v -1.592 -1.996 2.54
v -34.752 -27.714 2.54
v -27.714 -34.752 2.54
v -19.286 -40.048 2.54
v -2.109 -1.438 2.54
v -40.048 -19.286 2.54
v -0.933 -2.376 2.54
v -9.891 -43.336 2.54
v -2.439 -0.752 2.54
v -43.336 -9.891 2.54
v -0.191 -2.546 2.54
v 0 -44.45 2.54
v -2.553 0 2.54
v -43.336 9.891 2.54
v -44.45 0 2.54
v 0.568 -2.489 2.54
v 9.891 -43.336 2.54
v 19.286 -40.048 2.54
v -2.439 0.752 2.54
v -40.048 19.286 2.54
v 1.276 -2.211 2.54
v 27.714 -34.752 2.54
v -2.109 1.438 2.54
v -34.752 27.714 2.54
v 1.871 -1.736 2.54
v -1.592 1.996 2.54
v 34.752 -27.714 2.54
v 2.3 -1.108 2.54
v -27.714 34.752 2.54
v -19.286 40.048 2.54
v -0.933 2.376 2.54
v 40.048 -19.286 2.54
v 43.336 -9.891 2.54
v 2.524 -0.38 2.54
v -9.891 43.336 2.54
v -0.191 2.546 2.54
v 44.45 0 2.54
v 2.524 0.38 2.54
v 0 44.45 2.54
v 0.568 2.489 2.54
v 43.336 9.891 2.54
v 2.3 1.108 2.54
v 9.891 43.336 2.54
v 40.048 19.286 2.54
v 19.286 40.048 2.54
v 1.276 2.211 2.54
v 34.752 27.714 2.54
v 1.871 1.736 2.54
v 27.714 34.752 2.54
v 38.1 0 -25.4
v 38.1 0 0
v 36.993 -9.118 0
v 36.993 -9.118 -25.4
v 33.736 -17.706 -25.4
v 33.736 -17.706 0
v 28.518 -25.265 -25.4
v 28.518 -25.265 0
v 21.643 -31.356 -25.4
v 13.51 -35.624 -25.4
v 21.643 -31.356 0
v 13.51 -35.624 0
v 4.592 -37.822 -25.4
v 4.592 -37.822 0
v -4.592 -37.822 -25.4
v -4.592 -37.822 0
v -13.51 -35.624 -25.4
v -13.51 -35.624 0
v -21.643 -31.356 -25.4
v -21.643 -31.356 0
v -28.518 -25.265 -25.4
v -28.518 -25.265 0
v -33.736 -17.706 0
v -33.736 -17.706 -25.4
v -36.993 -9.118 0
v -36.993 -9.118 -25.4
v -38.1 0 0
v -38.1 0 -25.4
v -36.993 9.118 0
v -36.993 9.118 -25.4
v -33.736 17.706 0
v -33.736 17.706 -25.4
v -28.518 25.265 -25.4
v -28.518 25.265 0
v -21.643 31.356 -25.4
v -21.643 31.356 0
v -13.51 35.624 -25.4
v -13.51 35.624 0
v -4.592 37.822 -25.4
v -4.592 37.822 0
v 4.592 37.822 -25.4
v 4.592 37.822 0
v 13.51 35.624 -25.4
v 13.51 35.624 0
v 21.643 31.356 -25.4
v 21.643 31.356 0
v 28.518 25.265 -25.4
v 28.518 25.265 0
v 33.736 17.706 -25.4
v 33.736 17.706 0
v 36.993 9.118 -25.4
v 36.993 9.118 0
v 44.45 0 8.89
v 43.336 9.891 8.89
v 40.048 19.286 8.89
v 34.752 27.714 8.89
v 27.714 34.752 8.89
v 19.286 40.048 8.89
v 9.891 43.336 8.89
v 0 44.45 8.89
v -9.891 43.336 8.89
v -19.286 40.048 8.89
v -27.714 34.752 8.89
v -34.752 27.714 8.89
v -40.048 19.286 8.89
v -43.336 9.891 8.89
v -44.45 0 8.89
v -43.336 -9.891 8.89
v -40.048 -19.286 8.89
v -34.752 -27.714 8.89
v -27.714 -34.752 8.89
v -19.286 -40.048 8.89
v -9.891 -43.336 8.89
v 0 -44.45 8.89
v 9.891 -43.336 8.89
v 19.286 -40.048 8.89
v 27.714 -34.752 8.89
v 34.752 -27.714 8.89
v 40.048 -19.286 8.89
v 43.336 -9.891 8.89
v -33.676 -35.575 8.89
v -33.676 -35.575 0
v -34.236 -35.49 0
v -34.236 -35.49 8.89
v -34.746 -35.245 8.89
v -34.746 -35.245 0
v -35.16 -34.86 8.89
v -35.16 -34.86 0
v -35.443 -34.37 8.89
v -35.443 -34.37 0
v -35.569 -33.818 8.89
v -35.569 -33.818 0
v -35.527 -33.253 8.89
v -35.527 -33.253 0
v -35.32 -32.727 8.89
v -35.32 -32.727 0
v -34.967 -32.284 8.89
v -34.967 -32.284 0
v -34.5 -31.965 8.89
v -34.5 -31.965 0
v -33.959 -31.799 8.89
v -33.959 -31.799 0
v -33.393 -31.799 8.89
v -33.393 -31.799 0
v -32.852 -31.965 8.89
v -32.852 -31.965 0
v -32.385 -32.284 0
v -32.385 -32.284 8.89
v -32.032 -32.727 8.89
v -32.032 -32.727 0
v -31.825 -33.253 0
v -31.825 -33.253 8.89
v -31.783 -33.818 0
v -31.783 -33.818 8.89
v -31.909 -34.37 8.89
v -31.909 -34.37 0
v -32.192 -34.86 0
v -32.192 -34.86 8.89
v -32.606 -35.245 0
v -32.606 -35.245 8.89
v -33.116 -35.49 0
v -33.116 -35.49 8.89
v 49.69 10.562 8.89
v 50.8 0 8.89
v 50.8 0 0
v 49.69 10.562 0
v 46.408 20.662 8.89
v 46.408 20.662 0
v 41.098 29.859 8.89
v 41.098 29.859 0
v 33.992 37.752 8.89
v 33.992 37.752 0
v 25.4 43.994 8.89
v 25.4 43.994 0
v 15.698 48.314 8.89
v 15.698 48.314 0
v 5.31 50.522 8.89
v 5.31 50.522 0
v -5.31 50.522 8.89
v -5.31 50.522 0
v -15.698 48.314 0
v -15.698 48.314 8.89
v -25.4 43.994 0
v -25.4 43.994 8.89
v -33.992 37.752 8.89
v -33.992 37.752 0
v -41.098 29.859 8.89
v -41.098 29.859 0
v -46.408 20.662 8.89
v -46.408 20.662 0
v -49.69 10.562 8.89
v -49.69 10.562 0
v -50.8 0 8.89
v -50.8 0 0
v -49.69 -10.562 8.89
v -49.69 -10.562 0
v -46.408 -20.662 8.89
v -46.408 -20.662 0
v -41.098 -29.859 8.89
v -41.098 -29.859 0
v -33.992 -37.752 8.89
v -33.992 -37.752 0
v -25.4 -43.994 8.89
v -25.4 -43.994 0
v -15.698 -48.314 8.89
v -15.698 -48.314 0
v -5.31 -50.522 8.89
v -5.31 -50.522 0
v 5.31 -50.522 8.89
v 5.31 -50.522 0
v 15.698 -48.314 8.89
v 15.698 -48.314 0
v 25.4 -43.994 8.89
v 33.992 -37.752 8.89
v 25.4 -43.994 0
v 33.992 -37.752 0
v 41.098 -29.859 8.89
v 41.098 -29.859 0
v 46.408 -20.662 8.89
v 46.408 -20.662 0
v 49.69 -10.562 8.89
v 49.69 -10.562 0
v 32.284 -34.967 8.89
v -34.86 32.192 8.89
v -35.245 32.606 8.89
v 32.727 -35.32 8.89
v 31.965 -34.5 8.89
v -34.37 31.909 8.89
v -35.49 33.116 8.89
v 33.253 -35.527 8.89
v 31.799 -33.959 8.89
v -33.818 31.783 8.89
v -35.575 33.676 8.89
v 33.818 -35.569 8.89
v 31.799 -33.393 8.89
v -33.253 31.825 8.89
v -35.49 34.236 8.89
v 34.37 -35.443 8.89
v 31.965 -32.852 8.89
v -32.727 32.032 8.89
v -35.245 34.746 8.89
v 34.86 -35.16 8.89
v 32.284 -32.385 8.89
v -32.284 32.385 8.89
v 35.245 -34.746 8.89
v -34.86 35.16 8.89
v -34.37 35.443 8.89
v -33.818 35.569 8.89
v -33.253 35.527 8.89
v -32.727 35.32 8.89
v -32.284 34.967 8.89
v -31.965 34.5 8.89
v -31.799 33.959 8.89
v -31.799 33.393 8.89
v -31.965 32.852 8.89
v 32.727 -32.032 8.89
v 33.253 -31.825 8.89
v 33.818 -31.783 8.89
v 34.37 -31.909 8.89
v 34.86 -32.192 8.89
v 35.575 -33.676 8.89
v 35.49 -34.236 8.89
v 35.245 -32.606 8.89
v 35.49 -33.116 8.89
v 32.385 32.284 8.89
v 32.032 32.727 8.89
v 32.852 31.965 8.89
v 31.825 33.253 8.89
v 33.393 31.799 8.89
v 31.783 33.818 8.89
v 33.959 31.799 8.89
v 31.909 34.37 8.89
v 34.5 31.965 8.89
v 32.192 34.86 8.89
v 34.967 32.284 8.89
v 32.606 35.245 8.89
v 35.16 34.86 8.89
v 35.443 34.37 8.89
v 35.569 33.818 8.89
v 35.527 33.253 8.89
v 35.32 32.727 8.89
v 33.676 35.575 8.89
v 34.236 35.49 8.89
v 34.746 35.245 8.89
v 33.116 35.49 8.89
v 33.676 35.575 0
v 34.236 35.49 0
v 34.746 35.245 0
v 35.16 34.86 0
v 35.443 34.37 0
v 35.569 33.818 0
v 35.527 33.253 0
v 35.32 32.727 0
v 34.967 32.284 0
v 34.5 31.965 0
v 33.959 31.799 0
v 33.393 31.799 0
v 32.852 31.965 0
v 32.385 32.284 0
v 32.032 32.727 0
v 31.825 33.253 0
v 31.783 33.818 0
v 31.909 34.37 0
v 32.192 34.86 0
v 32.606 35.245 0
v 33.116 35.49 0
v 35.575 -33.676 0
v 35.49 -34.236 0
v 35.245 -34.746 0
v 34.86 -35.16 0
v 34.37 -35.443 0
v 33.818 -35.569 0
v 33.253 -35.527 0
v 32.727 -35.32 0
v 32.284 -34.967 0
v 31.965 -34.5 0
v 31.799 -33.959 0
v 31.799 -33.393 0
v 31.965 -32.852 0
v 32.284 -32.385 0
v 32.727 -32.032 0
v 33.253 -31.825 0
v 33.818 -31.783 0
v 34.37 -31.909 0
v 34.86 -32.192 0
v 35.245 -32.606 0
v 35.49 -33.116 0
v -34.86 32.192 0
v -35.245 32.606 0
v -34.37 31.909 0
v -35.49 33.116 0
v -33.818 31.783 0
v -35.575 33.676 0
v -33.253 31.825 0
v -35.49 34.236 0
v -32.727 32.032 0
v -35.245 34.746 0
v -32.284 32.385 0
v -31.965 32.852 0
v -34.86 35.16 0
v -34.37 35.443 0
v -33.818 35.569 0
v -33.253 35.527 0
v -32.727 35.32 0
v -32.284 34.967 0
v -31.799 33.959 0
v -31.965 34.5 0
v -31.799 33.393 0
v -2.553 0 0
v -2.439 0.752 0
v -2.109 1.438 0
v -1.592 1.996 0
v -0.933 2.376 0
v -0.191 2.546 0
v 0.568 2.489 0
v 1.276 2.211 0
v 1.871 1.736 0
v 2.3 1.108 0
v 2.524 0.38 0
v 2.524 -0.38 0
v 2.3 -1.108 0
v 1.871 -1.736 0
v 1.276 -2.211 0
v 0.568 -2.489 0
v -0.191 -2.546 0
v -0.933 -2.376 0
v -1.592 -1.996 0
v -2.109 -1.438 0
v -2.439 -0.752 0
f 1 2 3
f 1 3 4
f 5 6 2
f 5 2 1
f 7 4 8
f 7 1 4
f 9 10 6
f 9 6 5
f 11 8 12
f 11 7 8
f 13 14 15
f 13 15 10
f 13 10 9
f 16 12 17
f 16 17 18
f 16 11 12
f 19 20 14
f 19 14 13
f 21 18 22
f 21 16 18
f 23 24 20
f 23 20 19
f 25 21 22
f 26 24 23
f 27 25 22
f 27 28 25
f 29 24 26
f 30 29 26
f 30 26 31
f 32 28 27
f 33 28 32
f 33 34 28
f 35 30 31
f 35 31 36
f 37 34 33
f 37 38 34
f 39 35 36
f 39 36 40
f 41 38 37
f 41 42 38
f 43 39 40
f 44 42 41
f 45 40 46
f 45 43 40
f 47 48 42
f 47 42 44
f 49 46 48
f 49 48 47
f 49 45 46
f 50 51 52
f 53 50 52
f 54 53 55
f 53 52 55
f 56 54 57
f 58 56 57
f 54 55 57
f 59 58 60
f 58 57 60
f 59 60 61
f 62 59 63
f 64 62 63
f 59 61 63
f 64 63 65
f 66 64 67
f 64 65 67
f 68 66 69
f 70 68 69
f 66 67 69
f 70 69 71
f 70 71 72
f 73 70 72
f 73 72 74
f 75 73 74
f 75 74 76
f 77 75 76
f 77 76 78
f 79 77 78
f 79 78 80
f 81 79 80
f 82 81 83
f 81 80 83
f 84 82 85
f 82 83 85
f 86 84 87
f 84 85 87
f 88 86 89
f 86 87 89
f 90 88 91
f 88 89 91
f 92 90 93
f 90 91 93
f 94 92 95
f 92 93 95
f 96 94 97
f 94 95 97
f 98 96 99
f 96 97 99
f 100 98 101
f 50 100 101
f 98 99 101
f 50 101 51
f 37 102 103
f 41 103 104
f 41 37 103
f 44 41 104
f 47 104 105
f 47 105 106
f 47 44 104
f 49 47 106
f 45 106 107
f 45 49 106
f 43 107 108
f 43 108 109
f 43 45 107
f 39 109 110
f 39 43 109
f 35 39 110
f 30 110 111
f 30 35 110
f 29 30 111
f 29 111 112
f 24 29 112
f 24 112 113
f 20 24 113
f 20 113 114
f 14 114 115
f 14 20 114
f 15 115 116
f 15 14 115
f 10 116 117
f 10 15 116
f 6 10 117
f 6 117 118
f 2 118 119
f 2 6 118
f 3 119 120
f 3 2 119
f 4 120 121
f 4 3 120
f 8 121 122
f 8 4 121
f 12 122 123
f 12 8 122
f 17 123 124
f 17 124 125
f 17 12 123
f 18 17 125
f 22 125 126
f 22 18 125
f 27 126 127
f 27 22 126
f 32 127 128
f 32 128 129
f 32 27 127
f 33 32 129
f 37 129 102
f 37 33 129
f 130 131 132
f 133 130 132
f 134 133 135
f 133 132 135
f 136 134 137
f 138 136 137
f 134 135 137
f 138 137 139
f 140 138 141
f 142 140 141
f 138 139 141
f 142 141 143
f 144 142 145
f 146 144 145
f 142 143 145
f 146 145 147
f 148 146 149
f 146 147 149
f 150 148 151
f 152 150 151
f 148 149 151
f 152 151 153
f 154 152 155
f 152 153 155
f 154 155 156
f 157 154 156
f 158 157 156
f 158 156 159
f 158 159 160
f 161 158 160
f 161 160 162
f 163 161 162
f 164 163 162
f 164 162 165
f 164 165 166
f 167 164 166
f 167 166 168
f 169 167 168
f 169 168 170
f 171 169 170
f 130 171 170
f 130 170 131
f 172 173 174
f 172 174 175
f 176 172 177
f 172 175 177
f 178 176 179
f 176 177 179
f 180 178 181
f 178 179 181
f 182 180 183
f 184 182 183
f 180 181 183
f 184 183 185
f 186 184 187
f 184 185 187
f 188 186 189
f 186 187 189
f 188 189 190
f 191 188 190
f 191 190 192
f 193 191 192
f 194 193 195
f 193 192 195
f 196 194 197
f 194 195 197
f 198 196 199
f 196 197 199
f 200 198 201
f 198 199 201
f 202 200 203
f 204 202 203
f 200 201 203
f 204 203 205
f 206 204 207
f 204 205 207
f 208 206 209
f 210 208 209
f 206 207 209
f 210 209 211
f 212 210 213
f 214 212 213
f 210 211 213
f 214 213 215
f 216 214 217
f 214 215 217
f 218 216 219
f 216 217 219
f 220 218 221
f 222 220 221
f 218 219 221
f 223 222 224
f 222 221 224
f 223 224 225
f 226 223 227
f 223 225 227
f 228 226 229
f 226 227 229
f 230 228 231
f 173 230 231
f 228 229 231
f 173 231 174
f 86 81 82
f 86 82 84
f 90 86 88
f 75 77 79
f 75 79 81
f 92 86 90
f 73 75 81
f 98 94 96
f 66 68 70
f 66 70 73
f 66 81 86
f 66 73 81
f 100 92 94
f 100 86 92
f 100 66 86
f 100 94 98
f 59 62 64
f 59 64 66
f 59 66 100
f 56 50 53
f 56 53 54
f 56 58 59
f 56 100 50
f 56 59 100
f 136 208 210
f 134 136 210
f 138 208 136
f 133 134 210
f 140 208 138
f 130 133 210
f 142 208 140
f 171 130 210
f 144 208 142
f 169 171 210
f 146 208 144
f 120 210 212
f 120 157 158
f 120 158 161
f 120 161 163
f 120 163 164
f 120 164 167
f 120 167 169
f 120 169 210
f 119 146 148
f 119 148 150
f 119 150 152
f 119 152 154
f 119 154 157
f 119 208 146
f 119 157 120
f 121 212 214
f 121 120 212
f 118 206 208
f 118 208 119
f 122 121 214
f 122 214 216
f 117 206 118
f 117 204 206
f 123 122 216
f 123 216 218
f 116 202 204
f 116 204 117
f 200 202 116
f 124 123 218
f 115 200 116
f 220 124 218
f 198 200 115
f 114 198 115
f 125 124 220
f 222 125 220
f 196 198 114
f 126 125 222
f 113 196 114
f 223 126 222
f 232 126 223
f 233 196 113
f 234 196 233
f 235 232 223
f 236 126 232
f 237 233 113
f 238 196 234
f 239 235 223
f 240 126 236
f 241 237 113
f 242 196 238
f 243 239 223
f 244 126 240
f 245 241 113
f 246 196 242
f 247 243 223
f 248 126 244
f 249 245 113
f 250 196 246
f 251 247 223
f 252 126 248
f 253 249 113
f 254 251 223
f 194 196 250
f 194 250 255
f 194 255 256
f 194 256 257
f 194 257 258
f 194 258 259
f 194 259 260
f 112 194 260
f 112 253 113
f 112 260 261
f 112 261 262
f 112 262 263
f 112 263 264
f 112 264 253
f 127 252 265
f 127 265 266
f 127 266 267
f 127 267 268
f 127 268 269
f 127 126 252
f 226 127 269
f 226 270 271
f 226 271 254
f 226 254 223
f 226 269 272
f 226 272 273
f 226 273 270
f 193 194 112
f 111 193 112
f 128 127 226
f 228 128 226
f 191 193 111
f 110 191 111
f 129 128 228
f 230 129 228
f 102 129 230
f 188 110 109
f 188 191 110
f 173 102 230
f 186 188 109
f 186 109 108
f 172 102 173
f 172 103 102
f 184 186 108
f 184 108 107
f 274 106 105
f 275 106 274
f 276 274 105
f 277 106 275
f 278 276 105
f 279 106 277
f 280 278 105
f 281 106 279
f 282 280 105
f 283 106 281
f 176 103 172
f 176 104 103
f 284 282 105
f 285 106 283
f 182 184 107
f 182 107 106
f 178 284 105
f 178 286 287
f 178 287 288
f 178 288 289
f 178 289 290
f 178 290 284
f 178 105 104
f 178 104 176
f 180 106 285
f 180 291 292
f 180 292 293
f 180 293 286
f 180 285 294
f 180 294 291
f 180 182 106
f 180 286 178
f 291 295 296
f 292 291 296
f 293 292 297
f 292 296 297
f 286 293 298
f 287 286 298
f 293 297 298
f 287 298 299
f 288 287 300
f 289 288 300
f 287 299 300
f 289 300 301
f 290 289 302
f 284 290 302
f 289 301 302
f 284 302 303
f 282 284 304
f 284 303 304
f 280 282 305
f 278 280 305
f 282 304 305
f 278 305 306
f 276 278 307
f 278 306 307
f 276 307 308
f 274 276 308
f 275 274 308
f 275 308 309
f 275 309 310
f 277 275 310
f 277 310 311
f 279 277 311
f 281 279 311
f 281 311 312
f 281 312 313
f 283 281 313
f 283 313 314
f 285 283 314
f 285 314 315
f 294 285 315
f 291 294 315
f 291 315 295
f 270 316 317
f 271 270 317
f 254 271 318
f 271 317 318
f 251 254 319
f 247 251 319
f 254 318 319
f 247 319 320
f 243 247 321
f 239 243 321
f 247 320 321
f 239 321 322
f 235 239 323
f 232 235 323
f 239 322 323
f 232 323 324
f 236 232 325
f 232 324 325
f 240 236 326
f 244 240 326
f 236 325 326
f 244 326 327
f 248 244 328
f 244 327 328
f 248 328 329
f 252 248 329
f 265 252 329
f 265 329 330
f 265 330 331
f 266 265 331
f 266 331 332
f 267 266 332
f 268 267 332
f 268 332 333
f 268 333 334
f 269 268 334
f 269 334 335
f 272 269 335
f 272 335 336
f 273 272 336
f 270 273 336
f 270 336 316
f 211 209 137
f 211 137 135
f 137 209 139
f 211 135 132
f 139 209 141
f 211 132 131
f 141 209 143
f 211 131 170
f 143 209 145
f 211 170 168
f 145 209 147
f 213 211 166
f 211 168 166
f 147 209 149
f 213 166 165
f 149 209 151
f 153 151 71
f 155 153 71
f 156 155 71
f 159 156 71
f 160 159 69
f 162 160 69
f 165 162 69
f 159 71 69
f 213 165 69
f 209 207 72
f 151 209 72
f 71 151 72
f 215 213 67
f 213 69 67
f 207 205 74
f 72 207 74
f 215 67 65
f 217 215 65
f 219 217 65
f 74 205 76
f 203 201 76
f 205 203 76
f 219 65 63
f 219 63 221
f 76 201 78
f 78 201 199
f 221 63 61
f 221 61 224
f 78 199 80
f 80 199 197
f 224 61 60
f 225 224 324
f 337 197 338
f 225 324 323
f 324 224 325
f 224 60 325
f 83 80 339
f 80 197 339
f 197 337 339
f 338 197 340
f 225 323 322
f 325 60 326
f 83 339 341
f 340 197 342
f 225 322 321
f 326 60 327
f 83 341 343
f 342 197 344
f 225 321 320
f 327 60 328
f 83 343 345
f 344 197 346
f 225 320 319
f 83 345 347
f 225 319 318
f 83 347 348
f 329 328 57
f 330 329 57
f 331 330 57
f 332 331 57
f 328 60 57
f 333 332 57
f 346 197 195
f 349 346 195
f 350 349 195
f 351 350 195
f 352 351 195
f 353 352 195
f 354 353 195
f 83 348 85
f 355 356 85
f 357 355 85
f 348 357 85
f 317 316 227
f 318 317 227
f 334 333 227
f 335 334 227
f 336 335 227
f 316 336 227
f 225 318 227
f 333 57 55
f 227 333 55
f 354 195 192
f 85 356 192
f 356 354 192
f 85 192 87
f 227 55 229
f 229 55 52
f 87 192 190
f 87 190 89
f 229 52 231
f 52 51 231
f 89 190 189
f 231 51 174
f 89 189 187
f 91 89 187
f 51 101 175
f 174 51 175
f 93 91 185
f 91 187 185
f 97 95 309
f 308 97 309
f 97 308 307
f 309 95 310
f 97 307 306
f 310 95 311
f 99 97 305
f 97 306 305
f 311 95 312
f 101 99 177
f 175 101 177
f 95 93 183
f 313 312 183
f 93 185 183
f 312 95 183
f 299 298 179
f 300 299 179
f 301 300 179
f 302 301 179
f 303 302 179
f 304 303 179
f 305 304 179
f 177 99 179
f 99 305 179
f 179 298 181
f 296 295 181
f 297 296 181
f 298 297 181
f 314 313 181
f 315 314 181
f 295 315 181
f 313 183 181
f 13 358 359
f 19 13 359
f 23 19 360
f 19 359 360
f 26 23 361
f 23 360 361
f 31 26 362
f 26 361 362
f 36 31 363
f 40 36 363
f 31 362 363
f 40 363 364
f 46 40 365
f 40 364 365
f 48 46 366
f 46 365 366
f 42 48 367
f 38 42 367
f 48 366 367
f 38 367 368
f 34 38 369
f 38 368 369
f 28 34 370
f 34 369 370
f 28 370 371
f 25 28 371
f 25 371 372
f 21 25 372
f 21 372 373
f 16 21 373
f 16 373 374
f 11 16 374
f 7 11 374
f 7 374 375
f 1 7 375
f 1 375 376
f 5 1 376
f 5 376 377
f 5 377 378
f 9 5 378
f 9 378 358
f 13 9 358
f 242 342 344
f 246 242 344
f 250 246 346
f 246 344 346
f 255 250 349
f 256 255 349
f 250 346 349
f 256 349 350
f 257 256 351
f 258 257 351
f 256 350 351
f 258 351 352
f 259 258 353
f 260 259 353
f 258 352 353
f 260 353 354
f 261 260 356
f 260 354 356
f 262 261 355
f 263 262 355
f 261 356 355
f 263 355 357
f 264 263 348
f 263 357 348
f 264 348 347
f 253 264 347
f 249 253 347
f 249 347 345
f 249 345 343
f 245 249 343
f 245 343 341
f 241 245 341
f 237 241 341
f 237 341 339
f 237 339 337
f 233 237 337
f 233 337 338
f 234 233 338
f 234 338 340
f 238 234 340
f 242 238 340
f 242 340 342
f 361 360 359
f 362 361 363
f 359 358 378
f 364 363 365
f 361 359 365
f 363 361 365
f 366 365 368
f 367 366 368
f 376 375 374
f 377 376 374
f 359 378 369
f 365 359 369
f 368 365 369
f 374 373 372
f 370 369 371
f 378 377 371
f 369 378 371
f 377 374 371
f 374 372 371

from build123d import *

# Parameters (mm, degrees)
F0_R            = 50.8
F1_DEPTH        = 2.54
F2_R            = 50.8
F2_R_2          = 44.45
F3_DEPTH        = 6.35
F5_D            = 3.7973
F5_COPIES_COUNT = 4
F7_D            = 5.1054
F8_R            = 38.1
F8_R_2          = 2.5527
F9_DEPTH        = 25.4


# Not quite as in the source:
# - a pattern or mirror of a feature is missing from the dataset's text; its kind, count and spacing are read off the source's solid


with BuildPart() as f1:
    # F0 (on Top) → F1 (new body)
    with BuildSketch(Plane.XY):
        Circle(F0_R)
    extrude(amount=F1_DEPTH)

    # F2 (on face) → F3 (join)
    with BuildSketch(Plane.XY.offset(2.54)):
        Circle(F2_R)
        Circle(F2_R_2, mode=Mode.SUBTRACT)
    extrude(amount=F3_DEPTH)

    # F5 (through all)
    with Locations(Plane.XY.offset(8.89)):
        with Locations((-33.675960454, 33.675960454)):
            f5 = Hole(F5_D / 2)

    # F5_copies: F5 ×4 about axis
    f5_copies_axis = Axis((0, 0, 0), (0, 0, 1))
    for i in range(1, F5_COPIES_COUNT):
        add(f5.rotate(f5_copies_axis, i * 360 / F5_COPIES_COUNT), mode=Mode.SUBTRACT)

    # F7 (through all)
    with Locations(Plane.XY.offset(2.54)):
        with Locations((0, 0)):
            Hole(F7_D / 2)

    # F8 (on face) → F9 (join)
    with BuildSketch(Plane(origin=(0, 0, 0), x_dir=(1, 0, 0), z_dir=(0, 0, -1))):
        Circle(F8_R)
        Circle(F8_R_2, mode=Mode.SUBTRACT)
        Circle(F8_R_2)
    extrude(amount=F9_DEPTH)


solid = f1.part
